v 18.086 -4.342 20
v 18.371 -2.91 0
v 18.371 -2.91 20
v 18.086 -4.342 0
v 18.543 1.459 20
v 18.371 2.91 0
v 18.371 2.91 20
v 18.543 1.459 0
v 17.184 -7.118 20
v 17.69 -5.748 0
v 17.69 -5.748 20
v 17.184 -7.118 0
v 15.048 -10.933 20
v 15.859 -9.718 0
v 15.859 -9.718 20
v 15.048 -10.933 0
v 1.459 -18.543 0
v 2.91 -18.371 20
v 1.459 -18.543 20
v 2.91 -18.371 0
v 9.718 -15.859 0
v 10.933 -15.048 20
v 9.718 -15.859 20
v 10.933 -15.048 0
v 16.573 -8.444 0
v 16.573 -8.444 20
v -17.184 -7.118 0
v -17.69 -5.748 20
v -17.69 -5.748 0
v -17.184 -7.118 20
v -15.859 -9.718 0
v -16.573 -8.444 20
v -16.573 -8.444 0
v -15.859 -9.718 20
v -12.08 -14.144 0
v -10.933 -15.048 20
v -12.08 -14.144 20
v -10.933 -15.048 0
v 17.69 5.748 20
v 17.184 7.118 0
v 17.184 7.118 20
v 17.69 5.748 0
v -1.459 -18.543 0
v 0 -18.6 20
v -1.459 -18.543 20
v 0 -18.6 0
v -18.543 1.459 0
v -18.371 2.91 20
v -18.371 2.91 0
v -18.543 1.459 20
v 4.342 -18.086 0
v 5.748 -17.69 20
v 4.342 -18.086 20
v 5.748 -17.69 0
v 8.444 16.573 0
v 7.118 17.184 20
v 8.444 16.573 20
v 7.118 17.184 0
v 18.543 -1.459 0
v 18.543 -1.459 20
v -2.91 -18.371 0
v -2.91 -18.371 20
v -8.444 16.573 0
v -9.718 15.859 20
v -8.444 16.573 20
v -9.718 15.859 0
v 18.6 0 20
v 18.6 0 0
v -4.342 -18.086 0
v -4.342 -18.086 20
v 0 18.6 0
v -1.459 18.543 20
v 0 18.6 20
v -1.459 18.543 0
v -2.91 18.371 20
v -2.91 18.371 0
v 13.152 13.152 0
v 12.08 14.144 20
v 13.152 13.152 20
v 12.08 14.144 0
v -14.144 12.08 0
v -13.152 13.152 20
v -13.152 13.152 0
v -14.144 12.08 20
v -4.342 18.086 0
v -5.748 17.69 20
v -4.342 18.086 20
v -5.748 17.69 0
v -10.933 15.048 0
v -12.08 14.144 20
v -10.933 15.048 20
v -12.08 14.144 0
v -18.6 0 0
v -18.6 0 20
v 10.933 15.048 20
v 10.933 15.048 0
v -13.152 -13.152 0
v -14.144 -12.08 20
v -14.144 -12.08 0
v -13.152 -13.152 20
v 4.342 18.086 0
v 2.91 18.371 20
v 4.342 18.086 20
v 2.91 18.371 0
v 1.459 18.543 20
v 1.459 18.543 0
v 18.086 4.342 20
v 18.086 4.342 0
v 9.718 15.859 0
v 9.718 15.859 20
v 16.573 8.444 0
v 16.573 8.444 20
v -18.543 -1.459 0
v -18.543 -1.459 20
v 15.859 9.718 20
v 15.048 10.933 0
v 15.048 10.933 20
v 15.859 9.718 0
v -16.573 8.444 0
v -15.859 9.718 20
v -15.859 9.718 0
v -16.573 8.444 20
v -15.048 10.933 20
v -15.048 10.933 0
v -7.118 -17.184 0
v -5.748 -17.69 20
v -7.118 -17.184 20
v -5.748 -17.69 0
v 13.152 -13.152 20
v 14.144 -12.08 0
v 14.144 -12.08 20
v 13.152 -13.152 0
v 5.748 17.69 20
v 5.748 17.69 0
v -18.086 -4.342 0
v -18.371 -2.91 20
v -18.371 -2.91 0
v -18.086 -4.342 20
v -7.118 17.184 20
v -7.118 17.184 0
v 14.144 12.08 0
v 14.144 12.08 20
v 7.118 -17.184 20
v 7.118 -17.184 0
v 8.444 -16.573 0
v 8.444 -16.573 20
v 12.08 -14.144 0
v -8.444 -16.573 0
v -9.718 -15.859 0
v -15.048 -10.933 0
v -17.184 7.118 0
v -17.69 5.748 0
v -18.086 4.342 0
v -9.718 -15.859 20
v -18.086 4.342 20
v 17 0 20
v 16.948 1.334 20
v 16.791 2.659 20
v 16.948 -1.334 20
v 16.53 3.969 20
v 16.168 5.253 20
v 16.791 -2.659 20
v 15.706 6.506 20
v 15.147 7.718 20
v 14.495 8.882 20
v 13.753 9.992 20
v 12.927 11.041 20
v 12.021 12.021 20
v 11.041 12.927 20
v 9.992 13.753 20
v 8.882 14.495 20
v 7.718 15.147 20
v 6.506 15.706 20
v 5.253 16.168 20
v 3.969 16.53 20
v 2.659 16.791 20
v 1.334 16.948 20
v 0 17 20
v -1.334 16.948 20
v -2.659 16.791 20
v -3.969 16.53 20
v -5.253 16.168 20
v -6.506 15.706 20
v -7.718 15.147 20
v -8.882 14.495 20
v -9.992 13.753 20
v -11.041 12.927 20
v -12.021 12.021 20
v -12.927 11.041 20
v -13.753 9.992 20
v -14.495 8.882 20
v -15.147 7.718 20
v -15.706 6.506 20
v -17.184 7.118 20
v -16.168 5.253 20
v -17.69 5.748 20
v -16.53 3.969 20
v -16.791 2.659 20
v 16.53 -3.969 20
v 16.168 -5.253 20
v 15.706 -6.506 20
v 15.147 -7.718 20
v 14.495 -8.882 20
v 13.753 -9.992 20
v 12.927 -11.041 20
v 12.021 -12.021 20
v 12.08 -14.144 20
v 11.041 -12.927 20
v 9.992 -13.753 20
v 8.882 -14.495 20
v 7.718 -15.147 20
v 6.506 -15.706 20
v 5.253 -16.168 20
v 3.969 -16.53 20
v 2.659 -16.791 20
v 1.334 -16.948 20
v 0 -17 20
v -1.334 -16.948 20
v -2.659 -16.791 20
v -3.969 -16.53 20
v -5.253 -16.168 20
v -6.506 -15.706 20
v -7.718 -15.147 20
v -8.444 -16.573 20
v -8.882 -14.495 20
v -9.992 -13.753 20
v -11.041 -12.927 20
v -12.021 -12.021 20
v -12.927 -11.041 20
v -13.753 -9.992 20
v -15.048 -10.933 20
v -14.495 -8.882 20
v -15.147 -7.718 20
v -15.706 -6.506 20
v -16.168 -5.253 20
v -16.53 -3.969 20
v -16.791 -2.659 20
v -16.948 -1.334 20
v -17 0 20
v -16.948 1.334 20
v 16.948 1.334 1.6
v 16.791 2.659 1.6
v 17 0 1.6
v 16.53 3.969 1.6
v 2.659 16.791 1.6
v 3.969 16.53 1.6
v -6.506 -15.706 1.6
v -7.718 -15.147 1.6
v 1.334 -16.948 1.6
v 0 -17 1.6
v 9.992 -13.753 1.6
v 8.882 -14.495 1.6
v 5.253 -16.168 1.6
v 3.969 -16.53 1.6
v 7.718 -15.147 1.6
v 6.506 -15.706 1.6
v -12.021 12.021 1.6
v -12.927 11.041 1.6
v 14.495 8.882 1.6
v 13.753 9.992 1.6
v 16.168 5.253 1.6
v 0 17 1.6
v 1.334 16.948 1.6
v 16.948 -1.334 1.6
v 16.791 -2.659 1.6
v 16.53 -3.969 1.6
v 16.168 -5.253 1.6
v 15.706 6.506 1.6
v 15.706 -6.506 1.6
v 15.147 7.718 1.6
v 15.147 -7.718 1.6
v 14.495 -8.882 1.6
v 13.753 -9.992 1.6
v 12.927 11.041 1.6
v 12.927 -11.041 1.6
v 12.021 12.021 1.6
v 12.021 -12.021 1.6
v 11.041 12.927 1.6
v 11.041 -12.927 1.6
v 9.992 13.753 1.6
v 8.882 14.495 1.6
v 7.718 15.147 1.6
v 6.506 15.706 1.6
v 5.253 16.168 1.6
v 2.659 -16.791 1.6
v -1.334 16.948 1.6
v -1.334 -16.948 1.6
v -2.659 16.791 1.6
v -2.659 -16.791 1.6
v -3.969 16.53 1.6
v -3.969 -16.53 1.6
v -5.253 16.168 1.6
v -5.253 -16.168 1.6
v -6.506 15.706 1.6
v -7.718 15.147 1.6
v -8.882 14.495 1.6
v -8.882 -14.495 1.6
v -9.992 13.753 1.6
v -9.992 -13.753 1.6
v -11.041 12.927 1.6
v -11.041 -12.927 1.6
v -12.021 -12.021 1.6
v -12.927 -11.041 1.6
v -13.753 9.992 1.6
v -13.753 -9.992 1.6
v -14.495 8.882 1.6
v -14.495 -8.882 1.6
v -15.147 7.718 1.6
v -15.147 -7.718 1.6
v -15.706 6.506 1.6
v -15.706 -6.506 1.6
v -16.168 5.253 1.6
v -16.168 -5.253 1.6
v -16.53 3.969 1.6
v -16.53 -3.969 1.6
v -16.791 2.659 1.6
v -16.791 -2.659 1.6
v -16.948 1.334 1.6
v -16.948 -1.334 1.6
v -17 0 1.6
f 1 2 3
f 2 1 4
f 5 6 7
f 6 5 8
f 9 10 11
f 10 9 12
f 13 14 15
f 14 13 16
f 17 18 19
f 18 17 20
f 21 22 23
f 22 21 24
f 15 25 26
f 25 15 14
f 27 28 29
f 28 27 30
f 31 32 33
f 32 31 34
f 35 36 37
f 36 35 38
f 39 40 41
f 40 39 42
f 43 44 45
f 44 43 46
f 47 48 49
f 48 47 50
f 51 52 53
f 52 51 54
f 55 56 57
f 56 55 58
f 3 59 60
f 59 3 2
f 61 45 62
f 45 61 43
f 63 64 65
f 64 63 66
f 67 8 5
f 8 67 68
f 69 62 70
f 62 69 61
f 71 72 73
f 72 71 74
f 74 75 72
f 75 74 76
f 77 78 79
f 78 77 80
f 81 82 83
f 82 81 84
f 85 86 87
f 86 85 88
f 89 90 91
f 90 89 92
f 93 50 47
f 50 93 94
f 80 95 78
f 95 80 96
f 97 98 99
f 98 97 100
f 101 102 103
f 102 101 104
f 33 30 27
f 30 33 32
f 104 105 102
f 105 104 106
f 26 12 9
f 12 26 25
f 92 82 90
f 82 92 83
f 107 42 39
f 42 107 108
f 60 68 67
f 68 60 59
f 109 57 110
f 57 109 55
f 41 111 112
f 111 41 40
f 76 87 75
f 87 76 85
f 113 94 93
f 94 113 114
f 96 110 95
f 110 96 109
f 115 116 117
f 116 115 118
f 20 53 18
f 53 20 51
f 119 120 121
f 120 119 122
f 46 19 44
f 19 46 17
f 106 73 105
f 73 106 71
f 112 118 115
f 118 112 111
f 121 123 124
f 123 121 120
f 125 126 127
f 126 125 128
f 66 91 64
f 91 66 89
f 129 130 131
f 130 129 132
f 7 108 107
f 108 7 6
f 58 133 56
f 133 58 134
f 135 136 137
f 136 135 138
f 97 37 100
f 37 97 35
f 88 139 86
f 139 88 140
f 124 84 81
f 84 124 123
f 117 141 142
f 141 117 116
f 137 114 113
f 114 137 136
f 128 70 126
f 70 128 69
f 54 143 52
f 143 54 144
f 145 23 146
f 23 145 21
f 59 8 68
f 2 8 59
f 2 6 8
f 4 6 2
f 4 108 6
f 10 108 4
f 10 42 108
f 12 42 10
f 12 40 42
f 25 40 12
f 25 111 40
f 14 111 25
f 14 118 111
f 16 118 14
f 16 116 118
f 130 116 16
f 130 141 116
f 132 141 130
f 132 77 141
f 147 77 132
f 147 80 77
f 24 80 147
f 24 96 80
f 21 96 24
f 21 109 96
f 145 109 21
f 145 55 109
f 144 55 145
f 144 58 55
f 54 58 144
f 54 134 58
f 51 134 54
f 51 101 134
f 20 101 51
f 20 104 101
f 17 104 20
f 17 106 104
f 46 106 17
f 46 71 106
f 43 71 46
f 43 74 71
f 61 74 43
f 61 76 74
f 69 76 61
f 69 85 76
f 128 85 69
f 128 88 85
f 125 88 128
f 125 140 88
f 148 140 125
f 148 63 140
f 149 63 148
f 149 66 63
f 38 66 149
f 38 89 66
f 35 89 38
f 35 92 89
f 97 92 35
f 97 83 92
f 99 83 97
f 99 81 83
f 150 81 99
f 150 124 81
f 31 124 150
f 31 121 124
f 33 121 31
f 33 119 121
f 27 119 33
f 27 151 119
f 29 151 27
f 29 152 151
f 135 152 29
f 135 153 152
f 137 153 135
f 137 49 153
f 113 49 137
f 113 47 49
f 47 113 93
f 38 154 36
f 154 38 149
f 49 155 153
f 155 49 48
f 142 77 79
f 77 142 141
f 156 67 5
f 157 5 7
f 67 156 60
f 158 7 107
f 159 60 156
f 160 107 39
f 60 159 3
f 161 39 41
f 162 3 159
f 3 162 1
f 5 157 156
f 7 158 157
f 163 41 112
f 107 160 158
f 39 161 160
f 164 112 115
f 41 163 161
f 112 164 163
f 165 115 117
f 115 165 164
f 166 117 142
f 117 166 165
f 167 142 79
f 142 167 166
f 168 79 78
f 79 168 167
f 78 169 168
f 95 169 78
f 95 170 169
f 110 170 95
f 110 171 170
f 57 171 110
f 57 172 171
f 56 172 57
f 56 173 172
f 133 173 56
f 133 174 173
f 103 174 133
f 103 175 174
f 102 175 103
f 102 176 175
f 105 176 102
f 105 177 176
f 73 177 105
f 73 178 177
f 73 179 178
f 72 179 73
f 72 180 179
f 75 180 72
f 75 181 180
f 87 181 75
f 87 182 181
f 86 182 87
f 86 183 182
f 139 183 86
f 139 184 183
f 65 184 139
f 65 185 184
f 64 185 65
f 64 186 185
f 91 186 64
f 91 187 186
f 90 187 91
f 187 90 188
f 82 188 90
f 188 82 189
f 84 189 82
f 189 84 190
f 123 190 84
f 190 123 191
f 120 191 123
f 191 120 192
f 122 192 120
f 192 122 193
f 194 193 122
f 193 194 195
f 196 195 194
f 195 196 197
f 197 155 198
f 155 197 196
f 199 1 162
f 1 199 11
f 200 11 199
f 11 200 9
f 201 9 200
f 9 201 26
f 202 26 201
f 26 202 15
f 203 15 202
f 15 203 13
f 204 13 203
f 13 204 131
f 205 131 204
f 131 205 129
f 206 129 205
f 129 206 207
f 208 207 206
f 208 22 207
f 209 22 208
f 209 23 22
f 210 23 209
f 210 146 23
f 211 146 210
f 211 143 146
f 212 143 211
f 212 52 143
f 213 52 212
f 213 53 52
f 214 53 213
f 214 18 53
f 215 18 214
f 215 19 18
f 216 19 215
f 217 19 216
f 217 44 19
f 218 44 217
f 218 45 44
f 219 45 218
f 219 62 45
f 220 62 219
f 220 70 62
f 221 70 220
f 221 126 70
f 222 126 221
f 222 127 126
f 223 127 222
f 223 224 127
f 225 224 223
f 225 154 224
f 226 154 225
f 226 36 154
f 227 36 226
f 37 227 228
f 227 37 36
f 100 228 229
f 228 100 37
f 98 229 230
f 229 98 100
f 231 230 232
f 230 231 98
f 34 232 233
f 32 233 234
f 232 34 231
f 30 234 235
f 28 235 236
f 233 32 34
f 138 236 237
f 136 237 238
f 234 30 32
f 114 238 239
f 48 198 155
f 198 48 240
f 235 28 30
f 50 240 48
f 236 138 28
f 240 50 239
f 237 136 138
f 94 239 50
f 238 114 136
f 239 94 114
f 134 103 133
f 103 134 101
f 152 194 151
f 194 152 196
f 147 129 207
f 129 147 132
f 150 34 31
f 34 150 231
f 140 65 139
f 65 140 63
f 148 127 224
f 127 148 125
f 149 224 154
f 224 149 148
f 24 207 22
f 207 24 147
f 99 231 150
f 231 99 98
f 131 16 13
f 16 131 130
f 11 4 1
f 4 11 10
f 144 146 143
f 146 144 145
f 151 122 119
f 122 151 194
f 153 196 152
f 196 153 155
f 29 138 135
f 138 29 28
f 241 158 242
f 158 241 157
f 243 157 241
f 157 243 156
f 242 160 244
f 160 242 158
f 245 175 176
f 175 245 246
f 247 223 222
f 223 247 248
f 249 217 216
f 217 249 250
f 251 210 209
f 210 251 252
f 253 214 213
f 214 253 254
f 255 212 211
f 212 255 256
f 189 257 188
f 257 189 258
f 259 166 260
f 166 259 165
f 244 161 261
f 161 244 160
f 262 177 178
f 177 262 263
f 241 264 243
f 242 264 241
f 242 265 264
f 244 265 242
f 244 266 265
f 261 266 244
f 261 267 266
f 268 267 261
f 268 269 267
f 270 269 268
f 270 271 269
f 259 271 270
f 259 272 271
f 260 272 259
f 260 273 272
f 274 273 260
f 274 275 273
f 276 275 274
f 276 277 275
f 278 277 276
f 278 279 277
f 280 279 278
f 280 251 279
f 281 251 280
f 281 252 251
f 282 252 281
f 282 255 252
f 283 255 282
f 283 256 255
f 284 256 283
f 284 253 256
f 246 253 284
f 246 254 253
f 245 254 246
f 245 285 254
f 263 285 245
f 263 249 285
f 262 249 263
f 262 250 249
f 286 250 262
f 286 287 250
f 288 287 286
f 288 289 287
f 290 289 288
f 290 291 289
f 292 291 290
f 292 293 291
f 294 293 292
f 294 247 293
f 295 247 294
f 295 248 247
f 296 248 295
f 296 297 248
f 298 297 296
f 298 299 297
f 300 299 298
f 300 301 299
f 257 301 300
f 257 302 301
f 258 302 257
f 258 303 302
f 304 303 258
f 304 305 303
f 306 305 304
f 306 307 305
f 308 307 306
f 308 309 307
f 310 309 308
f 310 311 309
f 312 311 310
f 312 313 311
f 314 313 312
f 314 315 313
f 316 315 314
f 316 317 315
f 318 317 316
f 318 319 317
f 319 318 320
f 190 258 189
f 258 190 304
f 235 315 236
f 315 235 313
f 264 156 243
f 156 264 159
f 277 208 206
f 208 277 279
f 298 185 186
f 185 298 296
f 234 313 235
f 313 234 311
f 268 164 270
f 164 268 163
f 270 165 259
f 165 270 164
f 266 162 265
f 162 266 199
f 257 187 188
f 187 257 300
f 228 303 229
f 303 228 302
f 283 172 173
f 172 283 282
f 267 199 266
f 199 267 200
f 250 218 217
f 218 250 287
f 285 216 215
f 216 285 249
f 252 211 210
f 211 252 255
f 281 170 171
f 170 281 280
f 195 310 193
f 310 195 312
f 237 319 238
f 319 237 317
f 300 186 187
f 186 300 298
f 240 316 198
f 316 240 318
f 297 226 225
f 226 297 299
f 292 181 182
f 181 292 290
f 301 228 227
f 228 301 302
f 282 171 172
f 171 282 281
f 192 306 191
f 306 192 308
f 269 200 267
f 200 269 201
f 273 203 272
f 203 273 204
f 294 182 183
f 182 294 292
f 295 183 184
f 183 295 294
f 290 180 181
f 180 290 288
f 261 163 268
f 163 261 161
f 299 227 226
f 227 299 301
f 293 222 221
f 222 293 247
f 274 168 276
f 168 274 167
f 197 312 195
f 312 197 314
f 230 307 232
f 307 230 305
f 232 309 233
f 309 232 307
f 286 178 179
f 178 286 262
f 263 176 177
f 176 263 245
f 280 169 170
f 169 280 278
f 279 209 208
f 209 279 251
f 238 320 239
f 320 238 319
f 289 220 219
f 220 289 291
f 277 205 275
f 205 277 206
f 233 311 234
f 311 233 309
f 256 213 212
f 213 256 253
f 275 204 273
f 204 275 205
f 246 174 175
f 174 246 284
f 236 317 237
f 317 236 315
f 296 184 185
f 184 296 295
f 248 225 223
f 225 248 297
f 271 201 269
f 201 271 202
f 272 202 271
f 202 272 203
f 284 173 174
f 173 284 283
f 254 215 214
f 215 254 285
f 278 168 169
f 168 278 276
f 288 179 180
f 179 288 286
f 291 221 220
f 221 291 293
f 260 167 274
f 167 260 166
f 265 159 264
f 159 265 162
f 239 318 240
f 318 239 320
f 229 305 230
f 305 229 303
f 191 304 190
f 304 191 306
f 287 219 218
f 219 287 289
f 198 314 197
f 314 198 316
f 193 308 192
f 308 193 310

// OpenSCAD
T = 1.6;
H = 20;
ID = 34;
OD = ID + T*2;
$fn = 80;

difference() {
	cylinder(d=OD, h=H);
	translate([0, 0, T])
		cylinder(d=ID, h=H);
}
